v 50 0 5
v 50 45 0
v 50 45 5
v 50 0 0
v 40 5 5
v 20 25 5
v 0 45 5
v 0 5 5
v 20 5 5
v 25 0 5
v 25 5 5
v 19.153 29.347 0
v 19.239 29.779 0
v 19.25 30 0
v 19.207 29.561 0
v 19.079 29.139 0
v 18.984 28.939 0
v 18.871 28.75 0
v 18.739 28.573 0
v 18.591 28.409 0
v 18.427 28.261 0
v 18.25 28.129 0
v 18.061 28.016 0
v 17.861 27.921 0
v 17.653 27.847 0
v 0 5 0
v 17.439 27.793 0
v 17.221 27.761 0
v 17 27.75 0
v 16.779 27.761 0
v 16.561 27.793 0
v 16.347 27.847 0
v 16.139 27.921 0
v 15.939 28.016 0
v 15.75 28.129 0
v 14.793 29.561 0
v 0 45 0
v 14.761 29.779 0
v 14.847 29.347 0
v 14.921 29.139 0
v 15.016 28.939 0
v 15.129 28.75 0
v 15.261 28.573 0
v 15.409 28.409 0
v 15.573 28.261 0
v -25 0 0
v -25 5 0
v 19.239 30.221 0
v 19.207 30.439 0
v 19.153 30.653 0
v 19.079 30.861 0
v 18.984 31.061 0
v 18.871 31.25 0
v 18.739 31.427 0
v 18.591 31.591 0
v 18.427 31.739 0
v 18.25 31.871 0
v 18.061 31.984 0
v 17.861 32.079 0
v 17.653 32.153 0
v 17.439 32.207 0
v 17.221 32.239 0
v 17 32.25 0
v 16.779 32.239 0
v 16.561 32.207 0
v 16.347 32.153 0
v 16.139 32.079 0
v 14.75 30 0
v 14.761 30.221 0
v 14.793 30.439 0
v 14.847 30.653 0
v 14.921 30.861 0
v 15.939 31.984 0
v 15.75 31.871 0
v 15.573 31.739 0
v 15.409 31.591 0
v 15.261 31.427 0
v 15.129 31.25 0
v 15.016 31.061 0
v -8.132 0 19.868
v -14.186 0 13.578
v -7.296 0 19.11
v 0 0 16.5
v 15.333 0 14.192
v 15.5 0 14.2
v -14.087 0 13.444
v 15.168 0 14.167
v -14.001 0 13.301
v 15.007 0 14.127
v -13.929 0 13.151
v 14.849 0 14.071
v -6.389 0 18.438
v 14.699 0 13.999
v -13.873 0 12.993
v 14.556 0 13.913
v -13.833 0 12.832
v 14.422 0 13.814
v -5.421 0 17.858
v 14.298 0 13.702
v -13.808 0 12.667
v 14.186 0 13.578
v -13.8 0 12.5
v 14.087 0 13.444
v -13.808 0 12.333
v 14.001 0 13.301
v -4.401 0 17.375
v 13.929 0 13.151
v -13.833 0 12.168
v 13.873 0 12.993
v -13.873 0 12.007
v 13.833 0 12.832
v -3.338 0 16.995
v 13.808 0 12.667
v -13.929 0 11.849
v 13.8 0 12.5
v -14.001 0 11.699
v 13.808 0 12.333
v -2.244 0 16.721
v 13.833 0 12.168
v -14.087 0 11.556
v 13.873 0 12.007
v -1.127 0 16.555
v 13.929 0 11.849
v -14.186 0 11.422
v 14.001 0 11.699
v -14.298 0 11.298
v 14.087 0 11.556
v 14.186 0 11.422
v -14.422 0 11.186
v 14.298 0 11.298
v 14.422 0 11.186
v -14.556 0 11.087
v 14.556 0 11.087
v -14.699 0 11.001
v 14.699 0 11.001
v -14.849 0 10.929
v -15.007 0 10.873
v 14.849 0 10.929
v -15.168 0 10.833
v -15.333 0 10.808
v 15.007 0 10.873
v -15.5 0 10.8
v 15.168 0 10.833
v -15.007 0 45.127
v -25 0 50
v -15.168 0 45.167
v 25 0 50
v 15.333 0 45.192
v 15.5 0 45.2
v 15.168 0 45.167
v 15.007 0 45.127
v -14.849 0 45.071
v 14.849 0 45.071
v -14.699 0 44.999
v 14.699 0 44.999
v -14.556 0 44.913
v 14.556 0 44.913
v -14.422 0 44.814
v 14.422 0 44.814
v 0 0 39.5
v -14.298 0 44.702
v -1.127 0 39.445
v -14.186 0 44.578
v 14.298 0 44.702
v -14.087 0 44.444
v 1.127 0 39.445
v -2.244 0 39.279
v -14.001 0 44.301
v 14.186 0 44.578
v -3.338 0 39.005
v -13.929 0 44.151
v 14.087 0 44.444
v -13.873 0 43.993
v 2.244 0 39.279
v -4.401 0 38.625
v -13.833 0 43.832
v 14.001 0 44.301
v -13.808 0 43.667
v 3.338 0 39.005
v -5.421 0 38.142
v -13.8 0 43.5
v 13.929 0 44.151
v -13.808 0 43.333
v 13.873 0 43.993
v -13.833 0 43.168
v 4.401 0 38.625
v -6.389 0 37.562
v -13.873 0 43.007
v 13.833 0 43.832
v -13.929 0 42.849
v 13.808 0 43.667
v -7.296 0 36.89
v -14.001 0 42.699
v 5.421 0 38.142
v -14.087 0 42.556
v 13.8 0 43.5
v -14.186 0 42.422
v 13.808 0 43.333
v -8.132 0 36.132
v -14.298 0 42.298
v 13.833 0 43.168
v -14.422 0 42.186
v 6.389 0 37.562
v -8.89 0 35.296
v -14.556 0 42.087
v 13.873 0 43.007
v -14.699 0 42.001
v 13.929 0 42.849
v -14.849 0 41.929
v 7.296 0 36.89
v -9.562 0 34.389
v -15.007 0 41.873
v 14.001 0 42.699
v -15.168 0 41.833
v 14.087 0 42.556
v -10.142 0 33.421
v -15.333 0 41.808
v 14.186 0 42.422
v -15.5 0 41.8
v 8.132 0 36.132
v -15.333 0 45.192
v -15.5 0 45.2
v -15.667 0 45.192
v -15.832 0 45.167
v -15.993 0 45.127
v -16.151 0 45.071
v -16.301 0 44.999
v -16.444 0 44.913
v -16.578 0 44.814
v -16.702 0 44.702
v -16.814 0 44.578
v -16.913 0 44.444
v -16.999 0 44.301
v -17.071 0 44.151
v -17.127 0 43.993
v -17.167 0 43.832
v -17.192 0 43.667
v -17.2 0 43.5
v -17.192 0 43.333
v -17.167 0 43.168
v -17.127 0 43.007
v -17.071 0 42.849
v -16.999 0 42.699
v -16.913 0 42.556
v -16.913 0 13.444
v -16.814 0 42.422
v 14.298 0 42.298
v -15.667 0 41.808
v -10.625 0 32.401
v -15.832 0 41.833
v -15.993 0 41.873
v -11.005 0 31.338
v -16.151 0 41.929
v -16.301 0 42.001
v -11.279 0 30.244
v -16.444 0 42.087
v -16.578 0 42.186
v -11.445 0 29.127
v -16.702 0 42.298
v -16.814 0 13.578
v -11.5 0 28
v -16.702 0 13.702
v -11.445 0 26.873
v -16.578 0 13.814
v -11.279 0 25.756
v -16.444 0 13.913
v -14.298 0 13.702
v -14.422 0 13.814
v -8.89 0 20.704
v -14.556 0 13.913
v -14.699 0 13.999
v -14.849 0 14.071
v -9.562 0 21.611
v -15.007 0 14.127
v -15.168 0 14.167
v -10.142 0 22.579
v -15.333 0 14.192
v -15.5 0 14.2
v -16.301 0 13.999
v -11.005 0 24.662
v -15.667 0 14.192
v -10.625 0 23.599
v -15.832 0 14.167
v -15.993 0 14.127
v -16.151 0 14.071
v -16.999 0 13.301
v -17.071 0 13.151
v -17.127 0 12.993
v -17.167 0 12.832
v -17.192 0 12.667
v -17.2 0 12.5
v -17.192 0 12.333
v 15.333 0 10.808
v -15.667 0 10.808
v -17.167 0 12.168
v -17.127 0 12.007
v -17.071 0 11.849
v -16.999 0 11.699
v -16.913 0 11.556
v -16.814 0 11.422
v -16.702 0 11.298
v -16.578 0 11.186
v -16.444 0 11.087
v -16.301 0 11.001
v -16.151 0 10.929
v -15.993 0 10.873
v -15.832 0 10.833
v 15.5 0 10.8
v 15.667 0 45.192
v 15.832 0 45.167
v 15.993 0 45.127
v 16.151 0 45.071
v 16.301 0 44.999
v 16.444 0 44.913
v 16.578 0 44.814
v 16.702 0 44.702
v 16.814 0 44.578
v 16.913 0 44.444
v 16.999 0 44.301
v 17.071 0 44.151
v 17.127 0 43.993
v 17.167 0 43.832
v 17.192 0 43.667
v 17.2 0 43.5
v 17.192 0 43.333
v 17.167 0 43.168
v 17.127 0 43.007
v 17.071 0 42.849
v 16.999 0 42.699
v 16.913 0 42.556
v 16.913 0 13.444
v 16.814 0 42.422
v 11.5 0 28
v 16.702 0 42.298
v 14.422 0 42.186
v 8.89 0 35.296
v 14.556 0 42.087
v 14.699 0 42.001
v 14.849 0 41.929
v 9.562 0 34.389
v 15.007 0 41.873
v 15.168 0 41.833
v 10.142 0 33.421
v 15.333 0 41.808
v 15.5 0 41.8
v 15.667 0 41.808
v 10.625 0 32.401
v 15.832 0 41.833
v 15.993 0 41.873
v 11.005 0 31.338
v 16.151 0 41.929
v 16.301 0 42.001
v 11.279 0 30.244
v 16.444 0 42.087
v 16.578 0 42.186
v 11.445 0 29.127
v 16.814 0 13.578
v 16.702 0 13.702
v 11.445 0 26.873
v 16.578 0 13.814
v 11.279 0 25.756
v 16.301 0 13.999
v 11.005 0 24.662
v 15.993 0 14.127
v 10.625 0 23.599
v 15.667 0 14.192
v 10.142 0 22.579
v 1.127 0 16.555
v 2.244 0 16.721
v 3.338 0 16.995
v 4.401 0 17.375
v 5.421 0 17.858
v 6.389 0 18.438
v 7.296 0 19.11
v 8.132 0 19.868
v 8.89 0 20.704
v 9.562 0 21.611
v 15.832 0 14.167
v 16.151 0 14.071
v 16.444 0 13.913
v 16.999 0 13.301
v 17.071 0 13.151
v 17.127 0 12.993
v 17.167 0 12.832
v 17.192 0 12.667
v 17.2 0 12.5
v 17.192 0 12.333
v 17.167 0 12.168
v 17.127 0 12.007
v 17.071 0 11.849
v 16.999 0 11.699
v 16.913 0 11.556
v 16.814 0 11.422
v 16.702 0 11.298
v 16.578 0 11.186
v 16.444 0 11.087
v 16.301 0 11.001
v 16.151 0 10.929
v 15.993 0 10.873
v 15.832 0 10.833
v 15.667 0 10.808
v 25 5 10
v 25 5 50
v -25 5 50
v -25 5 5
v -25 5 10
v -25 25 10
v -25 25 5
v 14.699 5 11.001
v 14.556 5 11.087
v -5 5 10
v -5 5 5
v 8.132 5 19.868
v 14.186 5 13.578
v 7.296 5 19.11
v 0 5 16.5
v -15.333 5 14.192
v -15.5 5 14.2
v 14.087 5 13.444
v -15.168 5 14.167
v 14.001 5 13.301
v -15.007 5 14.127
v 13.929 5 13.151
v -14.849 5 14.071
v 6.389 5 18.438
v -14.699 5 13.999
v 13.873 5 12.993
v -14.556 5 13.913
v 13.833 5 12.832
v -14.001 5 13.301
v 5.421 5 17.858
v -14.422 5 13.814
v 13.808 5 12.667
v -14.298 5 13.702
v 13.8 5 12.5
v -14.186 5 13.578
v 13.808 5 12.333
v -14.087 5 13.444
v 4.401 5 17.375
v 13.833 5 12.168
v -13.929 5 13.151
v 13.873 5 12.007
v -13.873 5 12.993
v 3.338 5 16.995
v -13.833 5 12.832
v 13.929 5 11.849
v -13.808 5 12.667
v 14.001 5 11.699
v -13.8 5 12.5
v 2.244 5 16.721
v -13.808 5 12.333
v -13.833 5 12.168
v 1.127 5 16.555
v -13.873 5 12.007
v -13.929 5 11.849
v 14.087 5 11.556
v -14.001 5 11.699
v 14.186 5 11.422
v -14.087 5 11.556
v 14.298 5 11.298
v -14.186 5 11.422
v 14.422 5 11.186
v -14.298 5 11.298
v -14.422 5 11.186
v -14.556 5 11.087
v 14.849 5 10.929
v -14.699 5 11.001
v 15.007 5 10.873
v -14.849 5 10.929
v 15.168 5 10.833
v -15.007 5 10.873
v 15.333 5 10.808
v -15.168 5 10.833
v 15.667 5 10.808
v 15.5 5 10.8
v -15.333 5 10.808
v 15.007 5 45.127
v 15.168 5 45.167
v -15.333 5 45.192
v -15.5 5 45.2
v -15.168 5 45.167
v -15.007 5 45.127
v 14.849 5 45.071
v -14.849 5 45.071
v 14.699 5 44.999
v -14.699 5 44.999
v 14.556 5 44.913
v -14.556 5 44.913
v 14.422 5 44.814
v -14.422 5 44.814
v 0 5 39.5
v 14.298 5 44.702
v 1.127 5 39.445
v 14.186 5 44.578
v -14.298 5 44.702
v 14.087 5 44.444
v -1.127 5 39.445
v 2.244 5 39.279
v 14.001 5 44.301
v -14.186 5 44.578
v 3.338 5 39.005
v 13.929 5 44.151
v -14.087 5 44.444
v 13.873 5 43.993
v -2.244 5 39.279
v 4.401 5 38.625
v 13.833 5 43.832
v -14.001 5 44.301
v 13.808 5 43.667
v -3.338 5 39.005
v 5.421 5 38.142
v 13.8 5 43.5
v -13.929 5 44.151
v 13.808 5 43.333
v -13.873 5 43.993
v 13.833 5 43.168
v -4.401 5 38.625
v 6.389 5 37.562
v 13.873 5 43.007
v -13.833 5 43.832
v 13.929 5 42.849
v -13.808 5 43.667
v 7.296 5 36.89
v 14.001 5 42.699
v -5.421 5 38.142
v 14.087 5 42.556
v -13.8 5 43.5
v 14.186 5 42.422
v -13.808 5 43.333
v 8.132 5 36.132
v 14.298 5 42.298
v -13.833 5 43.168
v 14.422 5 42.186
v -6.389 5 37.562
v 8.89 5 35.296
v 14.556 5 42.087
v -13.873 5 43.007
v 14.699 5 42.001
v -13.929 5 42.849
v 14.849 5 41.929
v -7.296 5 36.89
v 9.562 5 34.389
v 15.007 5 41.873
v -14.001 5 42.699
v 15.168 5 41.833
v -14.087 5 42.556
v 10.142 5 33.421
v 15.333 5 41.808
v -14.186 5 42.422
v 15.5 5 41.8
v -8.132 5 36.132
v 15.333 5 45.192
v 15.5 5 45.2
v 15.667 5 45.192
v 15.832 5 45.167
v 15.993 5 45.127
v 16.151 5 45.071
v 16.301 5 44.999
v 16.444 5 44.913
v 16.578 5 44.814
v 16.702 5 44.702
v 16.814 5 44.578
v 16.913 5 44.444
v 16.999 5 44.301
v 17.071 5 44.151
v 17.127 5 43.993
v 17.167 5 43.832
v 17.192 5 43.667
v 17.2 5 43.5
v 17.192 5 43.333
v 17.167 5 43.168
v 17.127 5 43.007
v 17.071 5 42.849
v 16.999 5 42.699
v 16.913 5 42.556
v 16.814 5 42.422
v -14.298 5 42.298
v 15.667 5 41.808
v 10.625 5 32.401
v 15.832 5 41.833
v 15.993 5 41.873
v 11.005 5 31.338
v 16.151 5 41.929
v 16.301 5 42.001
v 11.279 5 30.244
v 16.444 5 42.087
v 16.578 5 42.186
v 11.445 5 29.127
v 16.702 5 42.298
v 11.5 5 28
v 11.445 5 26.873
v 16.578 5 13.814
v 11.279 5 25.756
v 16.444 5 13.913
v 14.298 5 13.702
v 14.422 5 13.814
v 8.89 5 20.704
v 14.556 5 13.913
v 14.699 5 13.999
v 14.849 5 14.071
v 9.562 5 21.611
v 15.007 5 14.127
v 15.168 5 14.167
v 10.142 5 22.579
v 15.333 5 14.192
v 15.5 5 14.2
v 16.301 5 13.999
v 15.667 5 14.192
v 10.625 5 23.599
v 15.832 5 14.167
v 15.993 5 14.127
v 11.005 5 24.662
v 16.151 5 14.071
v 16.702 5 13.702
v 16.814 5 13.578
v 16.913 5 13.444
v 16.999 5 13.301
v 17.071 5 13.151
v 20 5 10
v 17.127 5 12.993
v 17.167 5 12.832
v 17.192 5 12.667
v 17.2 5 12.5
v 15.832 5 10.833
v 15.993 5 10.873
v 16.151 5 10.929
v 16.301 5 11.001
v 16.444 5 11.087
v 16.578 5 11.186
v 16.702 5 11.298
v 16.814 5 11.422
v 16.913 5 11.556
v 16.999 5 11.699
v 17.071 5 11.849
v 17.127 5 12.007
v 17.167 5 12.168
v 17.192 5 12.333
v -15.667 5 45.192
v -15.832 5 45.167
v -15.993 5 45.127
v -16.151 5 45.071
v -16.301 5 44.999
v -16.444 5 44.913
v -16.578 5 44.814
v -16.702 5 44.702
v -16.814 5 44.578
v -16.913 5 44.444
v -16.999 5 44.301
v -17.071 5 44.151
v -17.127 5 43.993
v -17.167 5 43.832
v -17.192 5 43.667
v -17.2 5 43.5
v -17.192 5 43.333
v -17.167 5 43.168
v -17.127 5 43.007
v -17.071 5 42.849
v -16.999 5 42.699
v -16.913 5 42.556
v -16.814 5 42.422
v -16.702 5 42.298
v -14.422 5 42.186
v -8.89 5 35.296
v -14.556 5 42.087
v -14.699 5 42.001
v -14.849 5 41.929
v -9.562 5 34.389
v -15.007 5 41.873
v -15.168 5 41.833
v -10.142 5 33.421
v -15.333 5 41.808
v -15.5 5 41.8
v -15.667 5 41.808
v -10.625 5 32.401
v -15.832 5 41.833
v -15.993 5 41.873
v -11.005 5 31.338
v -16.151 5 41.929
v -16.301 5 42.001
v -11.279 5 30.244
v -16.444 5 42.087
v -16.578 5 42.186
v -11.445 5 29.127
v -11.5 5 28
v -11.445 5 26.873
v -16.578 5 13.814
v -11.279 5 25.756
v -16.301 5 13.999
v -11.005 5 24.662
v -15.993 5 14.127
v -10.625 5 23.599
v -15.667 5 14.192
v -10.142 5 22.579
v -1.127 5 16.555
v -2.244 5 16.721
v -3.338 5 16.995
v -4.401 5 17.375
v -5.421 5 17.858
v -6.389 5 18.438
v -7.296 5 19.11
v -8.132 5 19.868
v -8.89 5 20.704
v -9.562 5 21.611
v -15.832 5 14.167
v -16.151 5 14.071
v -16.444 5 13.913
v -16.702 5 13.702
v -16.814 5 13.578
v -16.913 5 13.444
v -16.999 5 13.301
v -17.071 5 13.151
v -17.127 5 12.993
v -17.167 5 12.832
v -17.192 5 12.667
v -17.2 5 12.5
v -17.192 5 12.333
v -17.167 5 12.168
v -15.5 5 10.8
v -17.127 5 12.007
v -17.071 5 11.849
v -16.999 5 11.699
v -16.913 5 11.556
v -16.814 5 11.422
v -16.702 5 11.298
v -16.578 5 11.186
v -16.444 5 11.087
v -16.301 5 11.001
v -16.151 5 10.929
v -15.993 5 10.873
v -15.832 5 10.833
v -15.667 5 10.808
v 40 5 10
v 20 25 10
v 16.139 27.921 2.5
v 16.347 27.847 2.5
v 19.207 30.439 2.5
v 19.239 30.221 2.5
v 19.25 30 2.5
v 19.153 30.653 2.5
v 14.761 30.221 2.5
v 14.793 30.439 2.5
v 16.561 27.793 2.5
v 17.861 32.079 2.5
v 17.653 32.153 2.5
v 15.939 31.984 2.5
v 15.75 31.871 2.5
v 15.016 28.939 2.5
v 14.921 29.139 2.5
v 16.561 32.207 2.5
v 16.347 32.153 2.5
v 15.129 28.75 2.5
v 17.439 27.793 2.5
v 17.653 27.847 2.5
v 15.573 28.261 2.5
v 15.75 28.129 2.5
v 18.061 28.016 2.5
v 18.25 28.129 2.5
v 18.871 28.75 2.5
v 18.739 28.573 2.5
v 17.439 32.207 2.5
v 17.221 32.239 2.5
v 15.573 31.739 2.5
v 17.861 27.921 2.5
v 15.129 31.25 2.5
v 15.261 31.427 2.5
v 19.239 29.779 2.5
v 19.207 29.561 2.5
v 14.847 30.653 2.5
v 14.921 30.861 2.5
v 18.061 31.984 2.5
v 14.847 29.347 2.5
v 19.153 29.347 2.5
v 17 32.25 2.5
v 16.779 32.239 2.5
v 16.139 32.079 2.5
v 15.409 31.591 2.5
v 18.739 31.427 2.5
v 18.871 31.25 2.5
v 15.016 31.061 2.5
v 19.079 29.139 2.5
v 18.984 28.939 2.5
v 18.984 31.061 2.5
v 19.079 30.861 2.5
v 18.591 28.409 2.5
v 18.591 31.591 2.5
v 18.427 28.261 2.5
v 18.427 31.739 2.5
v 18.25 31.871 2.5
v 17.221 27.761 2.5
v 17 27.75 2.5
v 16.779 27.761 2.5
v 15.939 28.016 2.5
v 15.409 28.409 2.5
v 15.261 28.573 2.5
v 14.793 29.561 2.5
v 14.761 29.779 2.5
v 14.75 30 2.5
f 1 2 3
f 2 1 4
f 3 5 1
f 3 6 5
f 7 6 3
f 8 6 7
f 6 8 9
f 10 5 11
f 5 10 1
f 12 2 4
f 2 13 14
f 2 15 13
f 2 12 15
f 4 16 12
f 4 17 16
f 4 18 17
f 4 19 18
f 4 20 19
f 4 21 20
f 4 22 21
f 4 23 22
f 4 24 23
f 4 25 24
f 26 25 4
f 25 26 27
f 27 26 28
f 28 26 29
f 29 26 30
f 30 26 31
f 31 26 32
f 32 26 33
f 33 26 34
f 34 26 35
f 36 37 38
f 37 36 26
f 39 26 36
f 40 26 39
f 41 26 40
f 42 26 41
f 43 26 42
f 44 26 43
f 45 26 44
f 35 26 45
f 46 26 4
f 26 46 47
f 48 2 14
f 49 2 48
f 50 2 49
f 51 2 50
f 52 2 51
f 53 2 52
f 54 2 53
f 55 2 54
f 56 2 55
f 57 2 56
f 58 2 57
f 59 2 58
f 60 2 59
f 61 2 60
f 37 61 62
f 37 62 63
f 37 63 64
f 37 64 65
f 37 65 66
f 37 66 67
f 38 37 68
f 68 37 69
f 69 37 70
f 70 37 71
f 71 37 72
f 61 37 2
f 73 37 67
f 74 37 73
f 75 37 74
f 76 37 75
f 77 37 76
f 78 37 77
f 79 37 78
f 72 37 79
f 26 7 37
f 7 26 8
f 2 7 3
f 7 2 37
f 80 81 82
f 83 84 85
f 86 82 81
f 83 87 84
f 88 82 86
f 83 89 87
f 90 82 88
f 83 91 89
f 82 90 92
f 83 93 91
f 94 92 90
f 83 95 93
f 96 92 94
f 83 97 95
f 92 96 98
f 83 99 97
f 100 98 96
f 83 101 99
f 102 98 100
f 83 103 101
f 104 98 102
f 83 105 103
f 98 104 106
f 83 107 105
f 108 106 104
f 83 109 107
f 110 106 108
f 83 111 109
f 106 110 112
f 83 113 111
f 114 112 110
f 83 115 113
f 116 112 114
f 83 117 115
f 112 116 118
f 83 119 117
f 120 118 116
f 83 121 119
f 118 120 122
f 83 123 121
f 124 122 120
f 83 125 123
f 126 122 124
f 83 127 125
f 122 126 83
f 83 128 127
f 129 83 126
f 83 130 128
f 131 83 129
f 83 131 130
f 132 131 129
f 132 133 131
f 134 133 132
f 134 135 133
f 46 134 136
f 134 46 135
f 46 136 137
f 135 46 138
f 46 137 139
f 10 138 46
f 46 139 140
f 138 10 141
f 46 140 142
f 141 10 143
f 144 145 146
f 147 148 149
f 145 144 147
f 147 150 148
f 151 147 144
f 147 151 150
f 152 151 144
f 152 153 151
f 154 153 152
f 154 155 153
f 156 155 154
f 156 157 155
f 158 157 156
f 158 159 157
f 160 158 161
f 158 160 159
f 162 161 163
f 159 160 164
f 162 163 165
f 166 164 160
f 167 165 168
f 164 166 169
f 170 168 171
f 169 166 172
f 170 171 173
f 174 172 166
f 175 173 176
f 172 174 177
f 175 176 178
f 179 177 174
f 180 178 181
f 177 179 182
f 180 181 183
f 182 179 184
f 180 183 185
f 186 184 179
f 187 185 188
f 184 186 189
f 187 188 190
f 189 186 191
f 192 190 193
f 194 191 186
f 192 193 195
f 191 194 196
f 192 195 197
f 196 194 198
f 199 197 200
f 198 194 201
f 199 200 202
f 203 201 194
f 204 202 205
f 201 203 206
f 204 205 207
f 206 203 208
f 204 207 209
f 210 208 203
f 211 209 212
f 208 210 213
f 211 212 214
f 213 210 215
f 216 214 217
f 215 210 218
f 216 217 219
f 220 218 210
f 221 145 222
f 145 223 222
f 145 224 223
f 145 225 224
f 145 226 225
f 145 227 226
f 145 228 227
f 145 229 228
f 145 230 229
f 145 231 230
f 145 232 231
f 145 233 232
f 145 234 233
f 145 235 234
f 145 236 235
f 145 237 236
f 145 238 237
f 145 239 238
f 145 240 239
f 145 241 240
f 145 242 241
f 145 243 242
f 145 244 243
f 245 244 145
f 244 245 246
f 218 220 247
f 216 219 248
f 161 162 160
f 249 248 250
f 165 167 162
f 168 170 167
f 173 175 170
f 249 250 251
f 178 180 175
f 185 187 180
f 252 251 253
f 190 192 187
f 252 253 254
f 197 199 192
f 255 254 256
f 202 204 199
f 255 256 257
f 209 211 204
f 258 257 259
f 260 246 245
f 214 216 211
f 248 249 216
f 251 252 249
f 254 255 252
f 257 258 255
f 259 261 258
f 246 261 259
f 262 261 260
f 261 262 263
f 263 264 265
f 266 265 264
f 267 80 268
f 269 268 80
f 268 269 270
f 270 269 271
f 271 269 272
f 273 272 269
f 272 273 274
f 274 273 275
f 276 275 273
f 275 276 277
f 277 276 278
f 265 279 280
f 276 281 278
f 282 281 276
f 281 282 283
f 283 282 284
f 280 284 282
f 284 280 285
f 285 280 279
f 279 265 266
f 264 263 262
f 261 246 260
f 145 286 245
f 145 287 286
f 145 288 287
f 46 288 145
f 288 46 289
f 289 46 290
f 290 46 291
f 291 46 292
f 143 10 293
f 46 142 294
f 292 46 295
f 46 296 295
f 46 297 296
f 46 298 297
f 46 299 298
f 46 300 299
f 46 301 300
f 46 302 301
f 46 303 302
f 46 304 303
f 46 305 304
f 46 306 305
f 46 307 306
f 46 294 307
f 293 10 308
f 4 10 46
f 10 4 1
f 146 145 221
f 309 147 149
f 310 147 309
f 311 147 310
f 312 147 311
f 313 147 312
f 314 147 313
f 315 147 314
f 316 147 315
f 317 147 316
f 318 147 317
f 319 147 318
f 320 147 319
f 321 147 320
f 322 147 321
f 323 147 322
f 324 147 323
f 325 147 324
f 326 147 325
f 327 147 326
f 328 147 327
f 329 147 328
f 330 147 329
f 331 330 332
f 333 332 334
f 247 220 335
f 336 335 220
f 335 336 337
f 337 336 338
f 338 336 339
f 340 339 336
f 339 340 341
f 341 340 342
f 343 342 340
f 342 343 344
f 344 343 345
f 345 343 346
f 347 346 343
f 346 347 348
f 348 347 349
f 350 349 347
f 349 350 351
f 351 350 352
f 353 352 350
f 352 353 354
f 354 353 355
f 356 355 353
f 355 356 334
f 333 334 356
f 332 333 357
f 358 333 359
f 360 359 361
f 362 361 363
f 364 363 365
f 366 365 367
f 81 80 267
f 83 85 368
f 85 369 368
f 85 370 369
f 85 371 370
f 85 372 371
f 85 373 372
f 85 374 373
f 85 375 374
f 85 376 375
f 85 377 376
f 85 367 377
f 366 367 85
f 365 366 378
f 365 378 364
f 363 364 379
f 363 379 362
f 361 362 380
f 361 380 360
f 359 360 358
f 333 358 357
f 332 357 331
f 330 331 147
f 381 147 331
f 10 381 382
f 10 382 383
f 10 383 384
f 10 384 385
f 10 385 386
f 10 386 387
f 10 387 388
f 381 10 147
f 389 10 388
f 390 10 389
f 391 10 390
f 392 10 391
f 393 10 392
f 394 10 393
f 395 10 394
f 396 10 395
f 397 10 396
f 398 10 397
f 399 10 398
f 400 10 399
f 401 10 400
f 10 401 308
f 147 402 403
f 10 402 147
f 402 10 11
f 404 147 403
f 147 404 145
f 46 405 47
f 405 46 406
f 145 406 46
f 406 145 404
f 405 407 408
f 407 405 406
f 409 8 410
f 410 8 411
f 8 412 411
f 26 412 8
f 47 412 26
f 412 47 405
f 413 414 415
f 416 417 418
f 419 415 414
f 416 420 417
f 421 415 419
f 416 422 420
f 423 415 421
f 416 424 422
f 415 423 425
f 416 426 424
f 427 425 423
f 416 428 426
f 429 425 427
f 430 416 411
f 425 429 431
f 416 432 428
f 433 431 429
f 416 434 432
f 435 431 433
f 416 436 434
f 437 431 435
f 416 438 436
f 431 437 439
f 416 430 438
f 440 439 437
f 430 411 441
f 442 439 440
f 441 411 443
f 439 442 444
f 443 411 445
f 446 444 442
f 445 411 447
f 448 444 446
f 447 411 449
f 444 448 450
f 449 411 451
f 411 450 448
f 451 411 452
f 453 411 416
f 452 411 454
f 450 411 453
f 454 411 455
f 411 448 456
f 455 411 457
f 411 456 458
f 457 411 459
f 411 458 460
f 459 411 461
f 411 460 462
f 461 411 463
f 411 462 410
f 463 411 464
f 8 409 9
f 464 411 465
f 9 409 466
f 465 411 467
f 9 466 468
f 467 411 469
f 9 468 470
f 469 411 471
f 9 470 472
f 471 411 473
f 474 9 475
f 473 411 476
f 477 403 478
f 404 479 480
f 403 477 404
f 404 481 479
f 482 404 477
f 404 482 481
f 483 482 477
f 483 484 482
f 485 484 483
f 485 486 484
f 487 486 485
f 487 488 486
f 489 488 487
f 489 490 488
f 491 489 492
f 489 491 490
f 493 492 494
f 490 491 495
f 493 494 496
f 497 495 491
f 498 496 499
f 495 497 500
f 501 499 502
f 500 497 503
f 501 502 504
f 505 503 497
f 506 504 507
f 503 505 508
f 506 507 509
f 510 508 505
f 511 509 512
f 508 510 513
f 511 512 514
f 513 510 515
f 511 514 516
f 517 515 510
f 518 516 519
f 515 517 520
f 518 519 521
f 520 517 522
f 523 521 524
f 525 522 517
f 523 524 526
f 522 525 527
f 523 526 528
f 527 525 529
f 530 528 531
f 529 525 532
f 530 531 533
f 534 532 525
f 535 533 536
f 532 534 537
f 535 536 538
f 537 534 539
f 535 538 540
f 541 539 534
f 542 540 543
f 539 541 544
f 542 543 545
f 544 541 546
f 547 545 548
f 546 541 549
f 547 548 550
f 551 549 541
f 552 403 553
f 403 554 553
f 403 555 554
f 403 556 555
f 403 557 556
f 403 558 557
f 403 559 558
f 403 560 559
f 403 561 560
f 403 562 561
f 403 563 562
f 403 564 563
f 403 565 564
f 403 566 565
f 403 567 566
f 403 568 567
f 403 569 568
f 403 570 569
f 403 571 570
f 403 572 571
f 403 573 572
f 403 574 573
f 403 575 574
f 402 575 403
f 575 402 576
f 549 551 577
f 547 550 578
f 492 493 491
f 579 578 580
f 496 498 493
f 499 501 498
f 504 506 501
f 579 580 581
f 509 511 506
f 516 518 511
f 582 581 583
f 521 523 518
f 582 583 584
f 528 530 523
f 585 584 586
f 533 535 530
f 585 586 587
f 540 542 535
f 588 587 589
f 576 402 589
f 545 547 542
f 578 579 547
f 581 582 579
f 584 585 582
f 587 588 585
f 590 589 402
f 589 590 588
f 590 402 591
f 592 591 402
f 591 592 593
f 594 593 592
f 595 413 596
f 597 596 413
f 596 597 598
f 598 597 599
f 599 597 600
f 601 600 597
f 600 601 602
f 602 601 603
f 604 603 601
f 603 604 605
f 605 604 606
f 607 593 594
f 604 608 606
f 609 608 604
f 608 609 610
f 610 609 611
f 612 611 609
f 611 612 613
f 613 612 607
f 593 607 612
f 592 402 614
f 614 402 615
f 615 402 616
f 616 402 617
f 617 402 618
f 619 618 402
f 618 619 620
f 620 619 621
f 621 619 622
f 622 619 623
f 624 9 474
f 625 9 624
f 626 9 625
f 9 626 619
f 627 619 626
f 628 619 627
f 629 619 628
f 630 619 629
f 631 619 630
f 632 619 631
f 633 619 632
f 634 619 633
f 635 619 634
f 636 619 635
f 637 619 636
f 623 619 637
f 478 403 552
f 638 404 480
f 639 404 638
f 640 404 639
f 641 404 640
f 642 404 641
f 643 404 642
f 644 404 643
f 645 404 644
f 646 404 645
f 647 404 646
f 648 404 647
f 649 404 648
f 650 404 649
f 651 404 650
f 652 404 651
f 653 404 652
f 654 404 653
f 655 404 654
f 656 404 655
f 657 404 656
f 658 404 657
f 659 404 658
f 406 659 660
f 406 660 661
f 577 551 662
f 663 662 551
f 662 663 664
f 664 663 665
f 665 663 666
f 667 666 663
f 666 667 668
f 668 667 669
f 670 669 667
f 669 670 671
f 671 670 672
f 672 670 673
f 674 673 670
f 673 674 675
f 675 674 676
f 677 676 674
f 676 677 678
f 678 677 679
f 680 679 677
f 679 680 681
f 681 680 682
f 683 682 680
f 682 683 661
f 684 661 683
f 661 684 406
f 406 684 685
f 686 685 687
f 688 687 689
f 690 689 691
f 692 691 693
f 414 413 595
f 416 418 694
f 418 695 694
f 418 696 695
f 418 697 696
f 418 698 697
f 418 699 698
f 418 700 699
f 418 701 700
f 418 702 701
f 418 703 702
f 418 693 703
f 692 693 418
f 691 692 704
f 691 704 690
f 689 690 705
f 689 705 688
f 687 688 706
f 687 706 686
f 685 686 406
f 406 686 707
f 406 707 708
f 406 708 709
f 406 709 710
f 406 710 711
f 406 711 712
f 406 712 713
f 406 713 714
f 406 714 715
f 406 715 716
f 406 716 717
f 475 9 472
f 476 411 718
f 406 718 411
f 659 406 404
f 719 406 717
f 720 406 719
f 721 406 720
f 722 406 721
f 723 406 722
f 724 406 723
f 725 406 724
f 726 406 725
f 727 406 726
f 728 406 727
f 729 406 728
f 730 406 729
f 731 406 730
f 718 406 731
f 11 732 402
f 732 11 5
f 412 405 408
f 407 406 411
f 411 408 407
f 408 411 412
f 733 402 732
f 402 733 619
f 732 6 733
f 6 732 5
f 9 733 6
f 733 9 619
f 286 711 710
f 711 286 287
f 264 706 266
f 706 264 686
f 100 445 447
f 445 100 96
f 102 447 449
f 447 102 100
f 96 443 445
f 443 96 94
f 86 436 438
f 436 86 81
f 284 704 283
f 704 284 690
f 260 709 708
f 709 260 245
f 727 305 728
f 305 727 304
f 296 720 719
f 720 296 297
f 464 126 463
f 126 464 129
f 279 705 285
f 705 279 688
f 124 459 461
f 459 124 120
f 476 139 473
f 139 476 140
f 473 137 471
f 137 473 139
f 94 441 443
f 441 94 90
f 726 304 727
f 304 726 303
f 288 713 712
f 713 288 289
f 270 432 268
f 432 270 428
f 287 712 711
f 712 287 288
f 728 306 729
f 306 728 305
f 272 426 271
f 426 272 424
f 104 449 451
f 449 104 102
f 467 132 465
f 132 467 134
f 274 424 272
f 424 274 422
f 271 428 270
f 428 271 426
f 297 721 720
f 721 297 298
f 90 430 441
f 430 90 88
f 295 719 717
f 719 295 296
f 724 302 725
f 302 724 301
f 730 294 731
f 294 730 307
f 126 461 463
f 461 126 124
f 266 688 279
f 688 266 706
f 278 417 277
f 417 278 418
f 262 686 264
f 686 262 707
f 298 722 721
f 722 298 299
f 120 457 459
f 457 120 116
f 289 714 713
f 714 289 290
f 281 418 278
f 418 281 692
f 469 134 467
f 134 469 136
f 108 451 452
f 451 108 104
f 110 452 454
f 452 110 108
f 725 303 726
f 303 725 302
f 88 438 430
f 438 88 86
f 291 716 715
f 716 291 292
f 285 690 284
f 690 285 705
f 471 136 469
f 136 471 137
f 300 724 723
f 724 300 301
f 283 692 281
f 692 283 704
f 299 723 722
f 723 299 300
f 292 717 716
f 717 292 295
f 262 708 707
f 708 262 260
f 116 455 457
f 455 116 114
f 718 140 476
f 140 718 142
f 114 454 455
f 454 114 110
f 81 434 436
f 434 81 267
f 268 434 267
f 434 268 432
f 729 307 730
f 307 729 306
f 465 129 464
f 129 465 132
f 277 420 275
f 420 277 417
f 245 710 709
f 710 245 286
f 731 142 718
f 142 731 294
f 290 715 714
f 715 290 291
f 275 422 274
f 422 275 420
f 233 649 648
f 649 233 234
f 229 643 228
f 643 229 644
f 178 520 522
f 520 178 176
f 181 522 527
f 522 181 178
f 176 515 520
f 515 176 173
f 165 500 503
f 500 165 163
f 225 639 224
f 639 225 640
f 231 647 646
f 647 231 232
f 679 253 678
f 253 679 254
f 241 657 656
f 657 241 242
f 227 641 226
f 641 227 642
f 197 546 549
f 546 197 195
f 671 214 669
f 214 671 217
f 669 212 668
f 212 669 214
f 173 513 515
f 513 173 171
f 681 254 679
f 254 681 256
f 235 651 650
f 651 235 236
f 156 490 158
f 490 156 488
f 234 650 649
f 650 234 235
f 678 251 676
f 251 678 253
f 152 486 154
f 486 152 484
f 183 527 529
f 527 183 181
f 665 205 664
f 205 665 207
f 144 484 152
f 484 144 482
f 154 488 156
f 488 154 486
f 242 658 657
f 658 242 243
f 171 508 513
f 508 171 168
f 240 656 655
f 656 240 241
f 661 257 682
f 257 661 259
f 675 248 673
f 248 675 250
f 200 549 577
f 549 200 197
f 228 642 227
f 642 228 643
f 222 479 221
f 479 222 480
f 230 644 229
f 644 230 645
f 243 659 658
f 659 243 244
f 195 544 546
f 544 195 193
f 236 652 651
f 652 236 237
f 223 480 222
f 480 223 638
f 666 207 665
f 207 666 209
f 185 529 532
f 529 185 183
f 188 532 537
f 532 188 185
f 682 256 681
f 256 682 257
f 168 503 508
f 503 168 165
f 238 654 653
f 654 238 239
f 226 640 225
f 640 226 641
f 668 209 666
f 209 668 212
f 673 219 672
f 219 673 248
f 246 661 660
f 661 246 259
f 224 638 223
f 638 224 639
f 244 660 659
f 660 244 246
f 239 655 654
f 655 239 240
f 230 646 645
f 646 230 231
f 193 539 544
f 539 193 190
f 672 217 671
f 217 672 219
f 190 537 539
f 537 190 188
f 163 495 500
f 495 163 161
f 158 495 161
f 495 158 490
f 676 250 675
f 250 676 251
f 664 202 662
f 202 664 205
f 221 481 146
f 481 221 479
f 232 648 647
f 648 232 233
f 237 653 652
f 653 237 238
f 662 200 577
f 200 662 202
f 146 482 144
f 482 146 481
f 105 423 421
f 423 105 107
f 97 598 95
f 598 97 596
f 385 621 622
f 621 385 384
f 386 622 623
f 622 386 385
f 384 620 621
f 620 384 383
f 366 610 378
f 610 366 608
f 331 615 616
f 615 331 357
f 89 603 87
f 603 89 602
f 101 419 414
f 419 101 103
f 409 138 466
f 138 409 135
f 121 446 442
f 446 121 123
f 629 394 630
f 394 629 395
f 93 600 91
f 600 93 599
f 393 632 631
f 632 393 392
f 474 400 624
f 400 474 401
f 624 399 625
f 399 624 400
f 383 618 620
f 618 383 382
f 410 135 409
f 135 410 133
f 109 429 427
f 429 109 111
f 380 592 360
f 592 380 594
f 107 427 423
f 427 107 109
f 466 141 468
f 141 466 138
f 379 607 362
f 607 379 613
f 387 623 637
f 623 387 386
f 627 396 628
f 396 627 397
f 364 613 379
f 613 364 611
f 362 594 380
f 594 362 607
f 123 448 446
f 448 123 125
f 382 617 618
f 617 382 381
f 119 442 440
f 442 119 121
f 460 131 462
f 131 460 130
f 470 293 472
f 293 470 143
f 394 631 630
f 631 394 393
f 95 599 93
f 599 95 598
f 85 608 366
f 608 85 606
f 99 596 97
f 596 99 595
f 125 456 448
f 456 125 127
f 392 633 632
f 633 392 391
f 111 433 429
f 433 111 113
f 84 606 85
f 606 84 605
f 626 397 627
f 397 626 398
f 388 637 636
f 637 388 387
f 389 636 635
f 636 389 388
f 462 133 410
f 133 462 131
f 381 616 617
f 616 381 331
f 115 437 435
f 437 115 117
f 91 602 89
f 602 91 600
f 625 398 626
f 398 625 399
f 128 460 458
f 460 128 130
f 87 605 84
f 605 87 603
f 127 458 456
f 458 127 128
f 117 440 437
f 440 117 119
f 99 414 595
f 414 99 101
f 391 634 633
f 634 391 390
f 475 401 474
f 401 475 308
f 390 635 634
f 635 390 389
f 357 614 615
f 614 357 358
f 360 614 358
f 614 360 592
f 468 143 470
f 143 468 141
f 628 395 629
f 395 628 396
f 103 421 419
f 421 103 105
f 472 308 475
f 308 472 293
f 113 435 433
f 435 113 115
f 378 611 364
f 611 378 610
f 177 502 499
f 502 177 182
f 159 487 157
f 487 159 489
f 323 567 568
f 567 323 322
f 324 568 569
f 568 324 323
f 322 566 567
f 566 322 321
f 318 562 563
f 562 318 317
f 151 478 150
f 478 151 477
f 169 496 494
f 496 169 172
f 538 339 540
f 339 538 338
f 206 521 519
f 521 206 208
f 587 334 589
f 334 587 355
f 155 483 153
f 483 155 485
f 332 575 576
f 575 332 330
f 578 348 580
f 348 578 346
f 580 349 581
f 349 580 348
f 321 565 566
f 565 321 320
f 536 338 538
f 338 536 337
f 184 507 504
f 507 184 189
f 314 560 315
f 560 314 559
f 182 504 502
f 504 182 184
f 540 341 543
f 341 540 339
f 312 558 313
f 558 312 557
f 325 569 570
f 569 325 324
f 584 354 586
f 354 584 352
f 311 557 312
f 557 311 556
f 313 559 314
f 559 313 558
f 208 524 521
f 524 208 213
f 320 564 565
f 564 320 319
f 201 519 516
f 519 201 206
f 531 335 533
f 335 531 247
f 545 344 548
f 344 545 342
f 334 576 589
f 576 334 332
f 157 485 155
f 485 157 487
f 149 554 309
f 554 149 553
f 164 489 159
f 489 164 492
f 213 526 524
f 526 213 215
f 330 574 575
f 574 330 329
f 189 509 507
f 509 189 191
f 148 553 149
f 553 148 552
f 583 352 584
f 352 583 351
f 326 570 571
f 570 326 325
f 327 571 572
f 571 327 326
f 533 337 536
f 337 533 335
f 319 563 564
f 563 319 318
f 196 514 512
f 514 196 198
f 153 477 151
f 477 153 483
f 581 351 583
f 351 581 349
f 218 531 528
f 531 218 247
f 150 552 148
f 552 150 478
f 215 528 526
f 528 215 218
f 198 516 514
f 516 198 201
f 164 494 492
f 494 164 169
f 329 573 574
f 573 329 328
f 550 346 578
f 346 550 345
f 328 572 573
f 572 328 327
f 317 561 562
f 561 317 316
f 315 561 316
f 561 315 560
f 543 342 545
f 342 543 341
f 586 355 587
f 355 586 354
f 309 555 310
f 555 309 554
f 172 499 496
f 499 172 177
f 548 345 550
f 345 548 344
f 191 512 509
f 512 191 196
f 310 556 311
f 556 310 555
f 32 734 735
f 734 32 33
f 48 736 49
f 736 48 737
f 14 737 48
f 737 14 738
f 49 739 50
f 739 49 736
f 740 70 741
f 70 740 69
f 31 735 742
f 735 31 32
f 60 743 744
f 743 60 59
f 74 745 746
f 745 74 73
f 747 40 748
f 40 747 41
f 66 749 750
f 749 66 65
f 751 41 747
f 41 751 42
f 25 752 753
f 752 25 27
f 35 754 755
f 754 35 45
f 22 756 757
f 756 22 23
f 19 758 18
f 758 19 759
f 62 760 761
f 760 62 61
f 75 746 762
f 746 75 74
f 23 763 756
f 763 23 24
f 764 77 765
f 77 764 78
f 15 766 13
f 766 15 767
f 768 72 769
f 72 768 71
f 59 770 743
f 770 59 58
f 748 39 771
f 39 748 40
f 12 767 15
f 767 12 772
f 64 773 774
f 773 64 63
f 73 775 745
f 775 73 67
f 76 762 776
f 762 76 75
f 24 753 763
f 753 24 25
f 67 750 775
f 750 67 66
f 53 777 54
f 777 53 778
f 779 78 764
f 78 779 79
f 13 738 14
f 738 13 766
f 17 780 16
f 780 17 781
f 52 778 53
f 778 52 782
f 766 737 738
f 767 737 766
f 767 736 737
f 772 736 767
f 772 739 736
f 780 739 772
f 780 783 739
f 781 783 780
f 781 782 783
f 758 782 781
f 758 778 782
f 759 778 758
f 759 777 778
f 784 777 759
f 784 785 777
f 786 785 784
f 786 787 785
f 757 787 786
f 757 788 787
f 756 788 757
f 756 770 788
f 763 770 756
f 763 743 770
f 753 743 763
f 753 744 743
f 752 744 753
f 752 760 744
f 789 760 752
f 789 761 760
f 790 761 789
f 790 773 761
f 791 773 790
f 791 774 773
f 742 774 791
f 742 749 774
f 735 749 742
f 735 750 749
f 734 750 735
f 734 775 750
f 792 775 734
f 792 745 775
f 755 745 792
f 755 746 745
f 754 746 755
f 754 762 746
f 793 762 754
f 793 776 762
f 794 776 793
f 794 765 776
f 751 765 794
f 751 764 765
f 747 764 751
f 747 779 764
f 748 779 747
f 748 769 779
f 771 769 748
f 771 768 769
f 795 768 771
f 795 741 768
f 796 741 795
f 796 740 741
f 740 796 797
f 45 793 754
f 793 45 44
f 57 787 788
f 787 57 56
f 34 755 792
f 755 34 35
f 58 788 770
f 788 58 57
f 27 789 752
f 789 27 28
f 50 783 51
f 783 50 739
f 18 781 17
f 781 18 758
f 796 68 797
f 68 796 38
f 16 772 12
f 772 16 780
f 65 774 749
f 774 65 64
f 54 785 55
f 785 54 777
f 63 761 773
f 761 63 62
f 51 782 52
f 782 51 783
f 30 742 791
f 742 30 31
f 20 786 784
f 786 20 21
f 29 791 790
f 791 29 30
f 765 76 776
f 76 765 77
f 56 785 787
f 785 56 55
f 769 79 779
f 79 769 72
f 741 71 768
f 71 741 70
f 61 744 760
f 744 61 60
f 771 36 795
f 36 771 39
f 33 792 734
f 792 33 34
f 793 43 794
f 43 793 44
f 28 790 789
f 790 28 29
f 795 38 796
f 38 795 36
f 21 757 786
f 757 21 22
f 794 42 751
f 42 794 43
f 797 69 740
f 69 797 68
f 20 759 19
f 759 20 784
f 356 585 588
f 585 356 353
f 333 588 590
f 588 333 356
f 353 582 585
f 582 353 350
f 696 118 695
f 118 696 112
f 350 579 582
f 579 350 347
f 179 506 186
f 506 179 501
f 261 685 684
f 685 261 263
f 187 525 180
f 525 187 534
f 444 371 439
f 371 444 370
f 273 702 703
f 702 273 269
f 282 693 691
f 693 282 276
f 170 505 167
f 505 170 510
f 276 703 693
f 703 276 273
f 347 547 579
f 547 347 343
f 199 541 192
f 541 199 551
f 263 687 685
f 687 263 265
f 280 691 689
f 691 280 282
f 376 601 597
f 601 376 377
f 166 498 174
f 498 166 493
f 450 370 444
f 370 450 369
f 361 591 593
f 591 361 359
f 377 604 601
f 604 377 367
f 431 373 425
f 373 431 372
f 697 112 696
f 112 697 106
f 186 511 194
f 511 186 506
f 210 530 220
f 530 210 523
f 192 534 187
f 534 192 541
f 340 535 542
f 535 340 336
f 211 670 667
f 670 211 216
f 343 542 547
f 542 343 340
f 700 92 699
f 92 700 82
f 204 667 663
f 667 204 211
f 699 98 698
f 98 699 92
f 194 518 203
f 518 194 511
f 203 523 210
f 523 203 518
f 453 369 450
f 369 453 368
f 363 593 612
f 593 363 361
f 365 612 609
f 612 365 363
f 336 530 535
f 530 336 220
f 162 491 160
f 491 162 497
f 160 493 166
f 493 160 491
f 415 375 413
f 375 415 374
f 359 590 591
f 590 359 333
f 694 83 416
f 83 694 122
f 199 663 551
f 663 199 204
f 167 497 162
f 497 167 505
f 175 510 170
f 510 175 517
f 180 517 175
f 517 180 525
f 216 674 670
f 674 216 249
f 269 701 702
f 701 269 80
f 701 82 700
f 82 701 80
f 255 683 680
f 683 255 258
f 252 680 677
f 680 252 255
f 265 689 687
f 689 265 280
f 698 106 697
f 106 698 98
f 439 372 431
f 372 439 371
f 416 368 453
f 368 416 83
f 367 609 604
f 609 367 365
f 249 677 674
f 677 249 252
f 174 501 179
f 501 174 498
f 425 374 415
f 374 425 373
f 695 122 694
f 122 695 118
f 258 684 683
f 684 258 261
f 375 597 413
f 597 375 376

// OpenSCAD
// NEMA 17 L-Bracket for Syringe Pump
// Print orientation: Base on bed (XY plane), building up Z.

// --- Dimensions ---
// Base Plate
base_x_min = -25;
base_x_max = 25;
base_y_min = 0;
base_y_max = 45;
base_z = 5;

// Vertical Motor Plate
vert_x_min = -25;
vert_x_max = 25;
vert_y_min = 0;
vert_y_max = 5;
vert_z = 50;

// Base Holes (M4)
base_hole_dia = 4.5;
base_hole_y = 30;
base_hole_x_offset = 17;

// Motor Boss Hole
boss_hole_dia = 23;
boss_hole_z = 28;

// Motor Mount Holes (M3)
mount_hole_dia = 3.4;
mount_pattern_size = 31; // Square pattern side length
mount_pattern_offset = mount_pattern_size / 2;

// Gussets
gusset_thickness = 5;
gusset_leg = 20;
gusset_x_start = 20; // Distance from center to start of gusset (25 - 5)
gusset_x_end = 25;

// --- Settings ---
$fn = 64; // High resolution for round holes

// --- Main Structure ---
difference() {
    union() {
        // 1. Base Plate
        translate([0, 0, 0])
            cube([base_x_max - base_x_min, base_y_max - base_y_min, base_z], center = [base_x_min + (base_x_max - base_x_min)/2, base_y_min, 0]);

        // 2. Vertical Motor Plate
        // Note: The prompt says y from 0 to 5. The base is y 0 to 45.
        // The vertical plate stands on the "back edge". Usually back is y=0 or y=max.
        // Given the base holes are at y=30 and gussets go +Y, the vertical plate is likely at y=0 (back).
        translate([vert_x_min, vert_y_min, 0])
            cube([vert_x_max - vert_x_min, vert_y_max - vert_y_min, vert_z]);

        // 3. Gussets
        // Left Gusset
        translate([base_x_min, vert_y_max, base_z]) {
            linear_extrude(height = gusset_thickness, convexity = 10)
                polygon(points = [
                    [0, 0], // Corner at y=5, z=5 (relative to start)
                    [gusset_leg, 0], // Along +Y
                    [0, gusset_leg]  // Along +Z
                ]);
        }

        // Right Gusset
        translate([base_x_max - gusset_thickness, vert_y_max, base_z]) {
            linear_extrude(height = gusset_thickness, convexity = 10)
                polygon(points = [
                    [0, 0], // Corner at y=5, z=5 (relative to start)
                    [gusset_leg, 0], // Along +Y
                    [0, gusset_leg]  // Along +Z
                ]);
        }
    }

    // --- Cuts ---

    // 1. Base Plate Holes (M4)
    // Hole 1
    translate([-base_hole_x_offset, base_hole_y, -1])
        cylinder(h = base_z + 2, r = base_hole_dia / 2, center = true);
    // Hole 2
    translate([base_hole_x_offset, base_hole_y, -1])
        cylinder(h = base_z + 2, r = base_hole_dia / 2, center = true);

    // 2. Motor Boss Hole (Through Y)
    // Center at x=0, z=28. Cuts through the vertical plate (y 0 to 5).
    translate([0, vert_y_min + (vert_y_max - vert_y_min)/2, boss_hole_z])
        rotate([90, 0, 0]) // Rotate to align cylinder along Y
        cylinder(h = vert_y_max - vert_y_min + 2, r = boss_hole_dia / 2, center = true);

    // 3. Motor Mount Holes (M3)
    // 4 holes on a 31mm square pattern centered on the boss hole (x=0, z=28)
    // Pattern is in the XZ plane of the vertical plate.
    // Holes go through Y.
    for (dx = [-mount_pattern_offset, mount_pattern_offset]) {
        for (dz = [-mount_pattern_offset, mount_pattern_offset]) {
            translate([dx, vert_y_min + (vert_y_max - vert_y_min)/2, boss_hole_z + dz])
                rotate([90, 0, 0]) // Align along Y
                cylinder(h = vert_y_max - vert_y_min + 2, r = mount_hole_dia / 2, center = true);
        }
    }
}
